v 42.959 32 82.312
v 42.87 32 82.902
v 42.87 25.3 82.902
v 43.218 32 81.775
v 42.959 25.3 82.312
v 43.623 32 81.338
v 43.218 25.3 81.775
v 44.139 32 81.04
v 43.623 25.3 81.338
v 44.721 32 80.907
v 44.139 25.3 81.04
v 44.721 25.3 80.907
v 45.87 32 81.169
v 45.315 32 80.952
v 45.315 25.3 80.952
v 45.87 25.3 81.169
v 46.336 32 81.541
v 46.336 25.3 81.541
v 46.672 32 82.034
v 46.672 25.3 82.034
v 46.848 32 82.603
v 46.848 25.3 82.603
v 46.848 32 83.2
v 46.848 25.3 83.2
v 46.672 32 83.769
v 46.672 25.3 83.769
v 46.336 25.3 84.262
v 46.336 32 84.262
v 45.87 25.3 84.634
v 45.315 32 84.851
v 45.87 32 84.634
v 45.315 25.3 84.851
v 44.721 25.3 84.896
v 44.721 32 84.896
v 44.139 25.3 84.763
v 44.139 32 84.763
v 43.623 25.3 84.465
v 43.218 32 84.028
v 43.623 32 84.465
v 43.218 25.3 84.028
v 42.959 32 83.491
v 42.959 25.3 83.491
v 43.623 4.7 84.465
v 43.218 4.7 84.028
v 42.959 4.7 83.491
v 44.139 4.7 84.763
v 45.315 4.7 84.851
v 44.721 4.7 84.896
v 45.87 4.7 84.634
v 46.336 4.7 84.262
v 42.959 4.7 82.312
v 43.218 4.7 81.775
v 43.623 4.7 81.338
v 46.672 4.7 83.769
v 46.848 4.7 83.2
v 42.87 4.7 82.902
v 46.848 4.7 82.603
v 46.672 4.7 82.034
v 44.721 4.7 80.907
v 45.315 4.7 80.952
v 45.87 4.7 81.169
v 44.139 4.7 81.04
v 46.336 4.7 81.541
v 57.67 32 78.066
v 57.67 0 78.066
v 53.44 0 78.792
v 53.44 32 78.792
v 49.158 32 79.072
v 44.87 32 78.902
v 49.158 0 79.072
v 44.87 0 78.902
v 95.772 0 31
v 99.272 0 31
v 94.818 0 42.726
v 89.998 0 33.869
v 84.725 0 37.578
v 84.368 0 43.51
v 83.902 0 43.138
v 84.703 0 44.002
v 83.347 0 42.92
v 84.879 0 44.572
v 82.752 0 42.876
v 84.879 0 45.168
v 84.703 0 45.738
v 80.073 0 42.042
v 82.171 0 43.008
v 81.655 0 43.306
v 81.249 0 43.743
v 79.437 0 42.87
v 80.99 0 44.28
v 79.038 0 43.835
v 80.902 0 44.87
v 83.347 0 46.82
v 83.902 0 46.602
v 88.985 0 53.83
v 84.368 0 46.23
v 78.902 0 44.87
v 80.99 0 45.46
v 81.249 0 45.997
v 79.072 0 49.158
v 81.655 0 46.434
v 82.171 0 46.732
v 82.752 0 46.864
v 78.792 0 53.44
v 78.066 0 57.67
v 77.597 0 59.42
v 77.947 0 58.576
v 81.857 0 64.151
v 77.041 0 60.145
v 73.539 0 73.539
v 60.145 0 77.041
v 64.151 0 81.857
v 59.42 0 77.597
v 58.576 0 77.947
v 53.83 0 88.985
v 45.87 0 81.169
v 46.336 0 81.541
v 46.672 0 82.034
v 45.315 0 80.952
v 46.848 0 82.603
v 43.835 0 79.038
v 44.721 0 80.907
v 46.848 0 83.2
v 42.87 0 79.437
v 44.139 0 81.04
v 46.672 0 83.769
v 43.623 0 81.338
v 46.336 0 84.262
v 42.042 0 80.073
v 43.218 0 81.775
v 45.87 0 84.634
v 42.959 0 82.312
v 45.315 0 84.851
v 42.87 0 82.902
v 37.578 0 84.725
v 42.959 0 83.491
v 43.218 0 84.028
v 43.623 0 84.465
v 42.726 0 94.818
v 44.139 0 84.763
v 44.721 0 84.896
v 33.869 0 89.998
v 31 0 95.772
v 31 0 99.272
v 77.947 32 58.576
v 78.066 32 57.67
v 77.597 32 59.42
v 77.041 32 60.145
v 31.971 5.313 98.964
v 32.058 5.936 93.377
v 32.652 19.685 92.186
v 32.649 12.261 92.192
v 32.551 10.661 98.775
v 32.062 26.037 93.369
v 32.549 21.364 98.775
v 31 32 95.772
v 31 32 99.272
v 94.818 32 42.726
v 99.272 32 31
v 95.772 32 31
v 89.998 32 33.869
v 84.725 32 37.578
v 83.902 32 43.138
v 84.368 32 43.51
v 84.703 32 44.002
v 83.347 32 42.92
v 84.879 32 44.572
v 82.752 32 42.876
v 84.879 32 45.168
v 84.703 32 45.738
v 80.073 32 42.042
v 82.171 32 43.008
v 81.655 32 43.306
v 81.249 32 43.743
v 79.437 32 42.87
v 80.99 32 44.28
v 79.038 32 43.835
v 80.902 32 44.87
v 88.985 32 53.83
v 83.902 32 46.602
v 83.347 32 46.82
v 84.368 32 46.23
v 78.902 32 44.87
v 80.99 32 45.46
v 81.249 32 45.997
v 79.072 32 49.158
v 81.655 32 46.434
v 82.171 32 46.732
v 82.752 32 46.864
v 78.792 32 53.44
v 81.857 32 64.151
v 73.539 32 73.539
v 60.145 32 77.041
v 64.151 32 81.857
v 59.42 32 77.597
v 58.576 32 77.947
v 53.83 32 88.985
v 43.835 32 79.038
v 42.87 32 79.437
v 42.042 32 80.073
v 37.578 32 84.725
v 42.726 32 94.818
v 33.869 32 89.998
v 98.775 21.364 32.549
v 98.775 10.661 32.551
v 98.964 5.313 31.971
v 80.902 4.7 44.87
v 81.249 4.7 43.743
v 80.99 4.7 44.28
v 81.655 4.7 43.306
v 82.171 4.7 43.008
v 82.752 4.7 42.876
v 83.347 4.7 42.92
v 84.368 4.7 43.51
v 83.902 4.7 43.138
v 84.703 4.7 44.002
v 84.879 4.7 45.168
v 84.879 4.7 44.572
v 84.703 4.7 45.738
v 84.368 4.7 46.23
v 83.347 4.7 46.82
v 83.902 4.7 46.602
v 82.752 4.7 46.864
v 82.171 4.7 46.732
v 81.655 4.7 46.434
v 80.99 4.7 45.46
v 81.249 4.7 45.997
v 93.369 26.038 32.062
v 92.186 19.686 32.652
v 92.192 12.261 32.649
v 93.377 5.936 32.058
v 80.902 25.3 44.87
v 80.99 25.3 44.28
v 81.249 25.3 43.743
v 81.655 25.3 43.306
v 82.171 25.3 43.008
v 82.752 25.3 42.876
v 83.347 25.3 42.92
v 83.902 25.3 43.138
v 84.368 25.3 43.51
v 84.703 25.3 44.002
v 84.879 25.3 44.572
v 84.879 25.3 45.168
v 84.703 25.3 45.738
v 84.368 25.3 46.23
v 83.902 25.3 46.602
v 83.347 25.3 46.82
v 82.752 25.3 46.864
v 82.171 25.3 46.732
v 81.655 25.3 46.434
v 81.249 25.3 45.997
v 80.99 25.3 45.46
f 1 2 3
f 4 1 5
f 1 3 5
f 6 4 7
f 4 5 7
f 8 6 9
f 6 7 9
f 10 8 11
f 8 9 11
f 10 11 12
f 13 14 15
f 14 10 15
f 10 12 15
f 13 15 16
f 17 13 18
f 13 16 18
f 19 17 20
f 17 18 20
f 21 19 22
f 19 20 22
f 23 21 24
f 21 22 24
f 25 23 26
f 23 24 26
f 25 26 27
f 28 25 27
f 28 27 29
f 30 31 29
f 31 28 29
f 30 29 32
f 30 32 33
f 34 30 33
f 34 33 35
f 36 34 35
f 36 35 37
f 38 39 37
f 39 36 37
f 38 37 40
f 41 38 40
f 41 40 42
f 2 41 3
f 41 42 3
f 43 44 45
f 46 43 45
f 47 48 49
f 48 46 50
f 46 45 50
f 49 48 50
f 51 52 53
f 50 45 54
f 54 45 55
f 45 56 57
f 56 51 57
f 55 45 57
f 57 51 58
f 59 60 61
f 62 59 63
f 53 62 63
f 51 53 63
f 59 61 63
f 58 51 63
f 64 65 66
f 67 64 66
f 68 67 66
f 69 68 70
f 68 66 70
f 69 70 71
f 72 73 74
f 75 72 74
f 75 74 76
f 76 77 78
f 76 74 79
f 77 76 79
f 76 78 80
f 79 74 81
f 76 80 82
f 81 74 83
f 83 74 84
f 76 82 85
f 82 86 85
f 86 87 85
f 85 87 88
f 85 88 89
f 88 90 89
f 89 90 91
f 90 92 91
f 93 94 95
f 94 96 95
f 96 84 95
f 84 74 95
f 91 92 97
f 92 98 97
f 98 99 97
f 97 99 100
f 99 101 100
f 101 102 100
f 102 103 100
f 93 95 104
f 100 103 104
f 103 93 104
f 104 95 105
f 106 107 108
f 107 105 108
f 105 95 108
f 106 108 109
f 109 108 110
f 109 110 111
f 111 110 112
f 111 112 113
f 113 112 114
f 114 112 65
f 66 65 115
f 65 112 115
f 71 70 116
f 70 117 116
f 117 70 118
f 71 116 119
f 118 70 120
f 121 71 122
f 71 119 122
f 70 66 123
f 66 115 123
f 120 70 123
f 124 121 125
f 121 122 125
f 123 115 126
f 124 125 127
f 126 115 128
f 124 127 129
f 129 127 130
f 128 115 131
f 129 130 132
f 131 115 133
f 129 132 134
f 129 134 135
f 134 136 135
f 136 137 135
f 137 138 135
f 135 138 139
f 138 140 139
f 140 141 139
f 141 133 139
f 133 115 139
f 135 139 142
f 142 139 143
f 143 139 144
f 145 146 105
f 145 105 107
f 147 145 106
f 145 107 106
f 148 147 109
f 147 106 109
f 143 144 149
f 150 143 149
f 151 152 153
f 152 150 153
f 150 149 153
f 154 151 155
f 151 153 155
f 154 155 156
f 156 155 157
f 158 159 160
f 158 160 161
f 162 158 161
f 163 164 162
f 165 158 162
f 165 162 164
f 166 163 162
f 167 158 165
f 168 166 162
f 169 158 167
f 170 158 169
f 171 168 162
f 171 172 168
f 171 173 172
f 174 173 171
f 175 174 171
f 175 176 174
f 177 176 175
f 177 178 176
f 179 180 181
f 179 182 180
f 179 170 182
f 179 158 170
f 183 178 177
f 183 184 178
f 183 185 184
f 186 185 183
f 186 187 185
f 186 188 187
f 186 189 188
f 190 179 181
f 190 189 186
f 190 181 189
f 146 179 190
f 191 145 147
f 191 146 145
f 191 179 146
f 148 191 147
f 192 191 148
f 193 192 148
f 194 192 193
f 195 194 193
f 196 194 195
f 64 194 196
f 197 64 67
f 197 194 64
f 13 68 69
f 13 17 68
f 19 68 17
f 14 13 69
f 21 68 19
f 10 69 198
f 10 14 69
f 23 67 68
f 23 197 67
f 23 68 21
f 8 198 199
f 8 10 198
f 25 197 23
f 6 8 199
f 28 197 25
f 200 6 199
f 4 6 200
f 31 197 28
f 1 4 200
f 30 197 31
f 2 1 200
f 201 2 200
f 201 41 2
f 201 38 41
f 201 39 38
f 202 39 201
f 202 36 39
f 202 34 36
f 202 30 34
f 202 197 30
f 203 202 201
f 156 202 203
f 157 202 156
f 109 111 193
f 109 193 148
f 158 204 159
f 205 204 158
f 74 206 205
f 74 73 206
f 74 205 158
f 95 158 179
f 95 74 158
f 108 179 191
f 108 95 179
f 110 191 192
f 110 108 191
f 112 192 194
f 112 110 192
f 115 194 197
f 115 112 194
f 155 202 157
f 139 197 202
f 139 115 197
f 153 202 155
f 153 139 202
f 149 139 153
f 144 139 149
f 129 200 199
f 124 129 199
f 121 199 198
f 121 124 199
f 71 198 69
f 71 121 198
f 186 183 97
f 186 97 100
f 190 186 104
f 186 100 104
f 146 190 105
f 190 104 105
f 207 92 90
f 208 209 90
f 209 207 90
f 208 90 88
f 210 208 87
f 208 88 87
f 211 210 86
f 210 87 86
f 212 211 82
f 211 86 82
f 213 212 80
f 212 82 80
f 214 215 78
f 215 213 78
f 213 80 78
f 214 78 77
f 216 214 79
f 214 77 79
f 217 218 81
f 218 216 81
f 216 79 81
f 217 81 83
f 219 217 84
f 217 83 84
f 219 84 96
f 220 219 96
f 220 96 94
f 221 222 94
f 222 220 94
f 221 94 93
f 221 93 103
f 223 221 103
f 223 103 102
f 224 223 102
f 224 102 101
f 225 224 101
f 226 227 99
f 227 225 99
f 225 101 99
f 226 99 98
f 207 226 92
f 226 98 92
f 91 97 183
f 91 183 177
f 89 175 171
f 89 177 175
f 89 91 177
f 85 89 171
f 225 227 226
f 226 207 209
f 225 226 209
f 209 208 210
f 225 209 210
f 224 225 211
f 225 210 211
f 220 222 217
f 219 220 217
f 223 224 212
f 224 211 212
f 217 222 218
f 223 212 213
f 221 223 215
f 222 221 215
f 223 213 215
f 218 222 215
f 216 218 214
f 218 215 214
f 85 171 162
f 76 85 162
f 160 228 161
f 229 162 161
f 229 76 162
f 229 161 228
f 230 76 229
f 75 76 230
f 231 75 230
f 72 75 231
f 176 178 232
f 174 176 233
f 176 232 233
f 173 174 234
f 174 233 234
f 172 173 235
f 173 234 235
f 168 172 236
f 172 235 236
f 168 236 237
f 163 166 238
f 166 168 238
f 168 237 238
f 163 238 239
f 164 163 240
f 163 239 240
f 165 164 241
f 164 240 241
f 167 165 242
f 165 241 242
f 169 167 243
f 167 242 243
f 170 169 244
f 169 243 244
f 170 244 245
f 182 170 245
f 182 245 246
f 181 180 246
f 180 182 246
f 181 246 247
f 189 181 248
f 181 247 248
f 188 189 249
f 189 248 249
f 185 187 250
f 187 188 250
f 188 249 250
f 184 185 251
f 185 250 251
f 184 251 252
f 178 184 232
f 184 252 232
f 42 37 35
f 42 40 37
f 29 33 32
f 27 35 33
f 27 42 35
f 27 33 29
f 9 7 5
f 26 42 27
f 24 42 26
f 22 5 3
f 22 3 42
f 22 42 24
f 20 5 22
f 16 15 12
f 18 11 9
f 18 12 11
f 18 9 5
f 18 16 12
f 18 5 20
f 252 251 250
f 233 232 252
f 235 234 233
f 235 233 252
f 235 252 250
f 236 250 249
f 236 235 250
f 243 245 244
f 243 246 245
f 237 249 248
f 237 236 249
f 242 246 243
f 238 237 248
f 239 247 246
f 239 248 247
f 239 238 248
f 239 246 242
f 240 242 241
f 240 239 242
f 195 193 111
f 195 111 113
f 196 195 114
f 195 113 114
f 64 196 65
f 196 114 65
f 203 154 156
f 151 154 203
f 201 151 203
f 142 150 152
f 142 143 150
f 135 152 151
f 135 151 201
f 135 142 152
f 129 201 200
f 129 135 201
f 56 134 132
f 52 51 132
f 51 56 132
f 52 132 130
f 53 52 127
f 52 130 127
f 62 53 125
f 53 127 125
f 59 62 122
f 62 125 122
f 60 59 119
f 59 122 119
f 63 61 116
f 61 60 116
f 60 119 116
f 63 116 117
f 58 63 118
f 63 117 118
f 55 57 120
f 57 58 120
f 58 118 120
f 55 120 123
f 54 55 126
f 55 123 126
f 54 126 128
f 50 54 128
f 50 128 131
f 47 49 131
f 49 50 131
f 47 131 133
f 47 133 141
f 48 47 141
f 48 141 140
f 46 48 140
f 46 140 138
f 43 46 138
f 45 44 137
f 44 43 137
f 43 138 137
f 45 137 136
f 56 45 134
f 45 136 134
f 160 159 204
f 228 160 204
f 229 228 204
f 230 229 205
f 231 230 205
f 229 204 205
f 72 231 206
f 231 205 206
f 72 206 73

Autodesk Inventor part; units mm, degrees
ref_plane "YZ Plane" through (0, 0, 0) normal (1, 0, 0) x (0, 1, 0)
ref_plane "XZ Plane" through (0, 0, 0) normal (0, 1, 0) x (-1, 0, 0)
ref_plane "XY Plane" through (0, 0, 0) normal (0, 0, 1) x (1, 0, 0)
sketch "Эскиз1" plane through (0, 0, 0) normal (0, 1, 0) x (-1, 0, 0)
  arc A0 (-31, 99.2724) -> (-99.2724, 31) centre (0, 0) ccw
  circle A1 centre (-74.5664, 57.67) radius 1.5
  circle A2 centre (-82.9015, 44.87) radius 1.5
  circle A3 centre (-57.67, 74.5664) radius 1.5
  circle A4 centre (-44.87, 82.9015) radius 1.5
  line L0 (-31, 99.2724) -> (-31, 78.7724)
  line L1 (-31, 78.7724) -> (31, 78.7724)
  circle A5 centre (-16, 72.43) radius 1.5
  circle A6 centre (16, 72.43) radius 1.5
  circle A7 centre (31, 72.43) radius 1.5
  line L2 (31, 78.7724) -> (31, 99.2724)
  circle A8 centre (16, 42.22) radius 1.5
  circle A9 centre (-16, 42.22) radius 1.5
  circle A10 centre (-42.22, 16) radius 1.5
  circle A11 centre (-72.43, 16) radius 1.5
  line L3 (-99.2724, 31) -> (-78.7724, 31)
  line L4 (-78.7724, 31) -> (-78.7724, -31)
  arc A12 (34.57, 98.0863) -> (98.0863, 34.57) centre (109.0212, 109.0212) ccw
  circle A13 centre (72.43, 31) radius 1.5
  line L5 (99.2724, 31) -> (78.7724, 31)
  line L6 (78.7724, 31) -> (78.7724, -31)
  circle A14 centre (72.43, 16) radius 1.5
  circle A15 centre (42.22, 16) radius 1.5
  circle A16 centre (42.22, -16) radius 1.5
  circle A17 centre (72.43, -16) radius 1.5
  circle A18 centre (82.9015, -44.87) radius 1.5
  line L7 (78.7724, -31) -> (99.2724, -31)
  arc A19 (31, -99.2724) -> (99.2724, -31) centre (0, 0) ccw
  circle A20 centre (74.5664, -57.67) radius 1.5
  circle A21 centre (16, -42.22) radius 1.5
  circle A22 centre (57.67, -74.5664) radius 1.5
  circle A23 centre (44.87, -82.9015) radius 1.5
  circle A24 centre (16, -72.43) radius 1.5
  line L8 (31, -78.7724) -> (31, -99.2724)
  line L9 (-31, -78.7724) -> (31, -78.7724)
  circle A25 centre (-16, -72.43) radius 1.5
  circle A26 centre (-16, -42.22) radius 1.5
  circle A27 centre (-31, -72.43) radius 1.5
  circle A28 centre (-42.22, -16) radius 1.5
  circle A29 centre (-72.43, -16) radius 1.5
  circle A30 centre (-72.43, -31) radius 1.5
  line L10 (-78.7724, -31) -> (-99.2724, -31)
  line L11 (-31, -99.2724) -> (-31, -78.7724)
  arc A31 (-34.57, -98.0863) -> (-31, -99.2724) centre (0, 0) ccw
  arc A32 (-99.2724, -31) -> (-98.0863, -34.57) centre (0, 0) ccw
  arc A33 (-34.57, -98.0863) -> (-98.0863, -34.57) centre (-109.0212, -109.0212) ccw
  line L12 (-73.5391, 73.5391) -> (73.5391, -73.5391) construction
  arc A34 (34.57, 98.0863) -> (31, 99.2724) centre (0, 0) ccw
  arc A35 (99.2724, 31) -> (98.0863, 34.57) centre (0, 0) ccw
  arc A36 (-98.0863, -34.57) -> (-34.57, -98.0863) centre (0, 0) ccw
  arc A37 (98.0863, 34.57) -> (34.57, 98.0863) centre (0, 0) ccw
sketch "Эскиз2" plane through (0, 0, 0) normal (0, 1, 0) x (-1, 0, 0)
  circle A0 centre (-82.9015, 44.87) radius 1.5 projected
  circle A1 centre (-44.87, 82.9015) radius 1.5 projected
  circle A2 centre (-44.87, 82.9015) radius 2
  circle A3 centre (-82.9015, 44.87) radius 2
  arc A4 (-31, 99.2724) -> (-99.2724, 31) centre (0, 0) ccw projected
  arc A5 (-31, 99.2724) -> (-99.2724, 31) centre (0, 0) ccw
  circle A6 centre (-44.87, 82.9015) radius 4
  circle A7 centre (-82.9015, 44.87) radius 4
  line L0 (-73.5391, 73.5391) -> (73.5391, -73.5391) construction
  line L1 (-31, 99.2724) -> (-31, 78.7724) projected
  line L2 (-99.2724, 31) -> (-78.7724, 31) projected
  arc A8 (-31, 95.7724) -> (-95.7724, 31) centre (0, 0) ccw construction
  line L3 (-31, 95.7724) -> (-95.7724, 31) construction
  line L4 (-42.0416, 85.7299) -> (-47.6984, 80.0731) construction
  circle A9 centre (-57.67, 74.5664) radius 1.5 construction
  circle A10 centre (-74.5664, 57.67) radius 1.5 construction
  circle A11 centre (-57.67, 74.5664) radius 3.5
  circle A12 centre (-74.5664, 57.67) radius 3.5
  line L5 (-60.1449, 77.0413) -> (-55.1951, 72.0915) construction
  line L6 (-77.0413, 60.1449) -> (-72.0915, 55.1951) construction
  line L7 (-60.1449, 77.0413) -> (-77.0413, 60.1449)
  line L8 (-44.87, 82.9015) -> (-42.0416, 80.0731) construction
  arc A13 (-42.0416, 80.0731) -> (-31, 95.7724) centre (-70.386, 111.7408) ccw
  line L9 (-42.0416, 80.0731) -> (-47.6984, 80.0731) construction
  line L10 (-44.87, 82.9015) -> (-44.87, 78.9015) construction
  line L11 (-55.1951, 77.0413) -> (-60.1449, 72.0915) construction
  line L12 (-60.1449, 77.0413) -> (-55.1951, 77.0413) construction
  line L13 (-57.67, 74.5664) -> (-57.67, 78.0664) construction
  arc A14 (-44.87, 78.9015) -> (-57.67, 78.0664) centre (-48.6366, 38.1205) ccw
  arc A15 (-78.0664, 57.67) -> (-78.9015, 44.87) centre (-38.1205, 48.6366) ccw
  line L14 (-82.9015, 44.87) -> (-80.0731, 42.0416) construction
  arc A16 (-95.7724, 31) -> (-80.0731, 42.0416) centre (-111.7408, 70.386) ccw
  point P0 (-95.7724, 31)
  point P1 (-95.7724, 31)
  point P2 (-78.9015, 44.87)
  dimension "d3" = 8
  dimension "d0" = 4
  dimension "d1" = 4
  dimension "d2" = 8
  dimension "d4" = 3.5
  dimension "d5" = 3.5
  dimension "d7" = 7
  dimension "d8" = 7
  dimension "d9" = 42.5
extrude "Выдавливание1" add sketch "Эскиз2" along normal blind 32 contours L1 A13 A6 A14 A11 L7 A12 A15 A7 A16 L2 A4 | A6 A14 | A7 A15 picked at (-41.5746, 83.2174) picked at (-80.8909, 42.2371)
ref_plane "РабПлоскость1" through (0, 25.3, 0) normal (0, 1, 0) x (1, 0, 0)
sketch "Эскиз3" plane through (0, 25.3, 0) normal (0, 1, 0) x (1, 0, 0)
  circle A0 centre (44.87, -82.9015) radius 2 projected
  circle A1 centre (82.9015, -44.87) radius 2 projected
  point P0 (0, 0)
extrude "Выдавливание2" add sketch "Эскиз3" against normal blind 20.6
ref_plane "РабПлоскость2" through (99.2724, 32, 31) normal (1, 0, 0) x (0, -1, 0)
sketch "Эскиз4" plane through (99.2724, 32, 31) normal (1, 0, 0) x (0, -1, 0)
  arc A0 (0, 0) -> (32, 0) centre (16, 72.5568) ccw
  line L0 (32, 0) -> (0, 0) projected
  line L1 (0, 0) -> (32, 0)
  point P0 (32, 31)
  dimension "d15" = 74.3
extrude "Выдавливание3" cut sketch "Эскиз4" against normal blind 20.6
ref_plane "РабПлоскость3" through (73.5391, 32, 73.5391) normal (0.7071, 0, -0.7071) x (0, -1, 0)
mirror "Зеркальное отражение1" about plane through (73.5391, 32, 73.5391) normal (0.7071, 0, -0.7071) of "Выдавливание3"
equation "\"d5\" = d4"
properties part number "protect"
